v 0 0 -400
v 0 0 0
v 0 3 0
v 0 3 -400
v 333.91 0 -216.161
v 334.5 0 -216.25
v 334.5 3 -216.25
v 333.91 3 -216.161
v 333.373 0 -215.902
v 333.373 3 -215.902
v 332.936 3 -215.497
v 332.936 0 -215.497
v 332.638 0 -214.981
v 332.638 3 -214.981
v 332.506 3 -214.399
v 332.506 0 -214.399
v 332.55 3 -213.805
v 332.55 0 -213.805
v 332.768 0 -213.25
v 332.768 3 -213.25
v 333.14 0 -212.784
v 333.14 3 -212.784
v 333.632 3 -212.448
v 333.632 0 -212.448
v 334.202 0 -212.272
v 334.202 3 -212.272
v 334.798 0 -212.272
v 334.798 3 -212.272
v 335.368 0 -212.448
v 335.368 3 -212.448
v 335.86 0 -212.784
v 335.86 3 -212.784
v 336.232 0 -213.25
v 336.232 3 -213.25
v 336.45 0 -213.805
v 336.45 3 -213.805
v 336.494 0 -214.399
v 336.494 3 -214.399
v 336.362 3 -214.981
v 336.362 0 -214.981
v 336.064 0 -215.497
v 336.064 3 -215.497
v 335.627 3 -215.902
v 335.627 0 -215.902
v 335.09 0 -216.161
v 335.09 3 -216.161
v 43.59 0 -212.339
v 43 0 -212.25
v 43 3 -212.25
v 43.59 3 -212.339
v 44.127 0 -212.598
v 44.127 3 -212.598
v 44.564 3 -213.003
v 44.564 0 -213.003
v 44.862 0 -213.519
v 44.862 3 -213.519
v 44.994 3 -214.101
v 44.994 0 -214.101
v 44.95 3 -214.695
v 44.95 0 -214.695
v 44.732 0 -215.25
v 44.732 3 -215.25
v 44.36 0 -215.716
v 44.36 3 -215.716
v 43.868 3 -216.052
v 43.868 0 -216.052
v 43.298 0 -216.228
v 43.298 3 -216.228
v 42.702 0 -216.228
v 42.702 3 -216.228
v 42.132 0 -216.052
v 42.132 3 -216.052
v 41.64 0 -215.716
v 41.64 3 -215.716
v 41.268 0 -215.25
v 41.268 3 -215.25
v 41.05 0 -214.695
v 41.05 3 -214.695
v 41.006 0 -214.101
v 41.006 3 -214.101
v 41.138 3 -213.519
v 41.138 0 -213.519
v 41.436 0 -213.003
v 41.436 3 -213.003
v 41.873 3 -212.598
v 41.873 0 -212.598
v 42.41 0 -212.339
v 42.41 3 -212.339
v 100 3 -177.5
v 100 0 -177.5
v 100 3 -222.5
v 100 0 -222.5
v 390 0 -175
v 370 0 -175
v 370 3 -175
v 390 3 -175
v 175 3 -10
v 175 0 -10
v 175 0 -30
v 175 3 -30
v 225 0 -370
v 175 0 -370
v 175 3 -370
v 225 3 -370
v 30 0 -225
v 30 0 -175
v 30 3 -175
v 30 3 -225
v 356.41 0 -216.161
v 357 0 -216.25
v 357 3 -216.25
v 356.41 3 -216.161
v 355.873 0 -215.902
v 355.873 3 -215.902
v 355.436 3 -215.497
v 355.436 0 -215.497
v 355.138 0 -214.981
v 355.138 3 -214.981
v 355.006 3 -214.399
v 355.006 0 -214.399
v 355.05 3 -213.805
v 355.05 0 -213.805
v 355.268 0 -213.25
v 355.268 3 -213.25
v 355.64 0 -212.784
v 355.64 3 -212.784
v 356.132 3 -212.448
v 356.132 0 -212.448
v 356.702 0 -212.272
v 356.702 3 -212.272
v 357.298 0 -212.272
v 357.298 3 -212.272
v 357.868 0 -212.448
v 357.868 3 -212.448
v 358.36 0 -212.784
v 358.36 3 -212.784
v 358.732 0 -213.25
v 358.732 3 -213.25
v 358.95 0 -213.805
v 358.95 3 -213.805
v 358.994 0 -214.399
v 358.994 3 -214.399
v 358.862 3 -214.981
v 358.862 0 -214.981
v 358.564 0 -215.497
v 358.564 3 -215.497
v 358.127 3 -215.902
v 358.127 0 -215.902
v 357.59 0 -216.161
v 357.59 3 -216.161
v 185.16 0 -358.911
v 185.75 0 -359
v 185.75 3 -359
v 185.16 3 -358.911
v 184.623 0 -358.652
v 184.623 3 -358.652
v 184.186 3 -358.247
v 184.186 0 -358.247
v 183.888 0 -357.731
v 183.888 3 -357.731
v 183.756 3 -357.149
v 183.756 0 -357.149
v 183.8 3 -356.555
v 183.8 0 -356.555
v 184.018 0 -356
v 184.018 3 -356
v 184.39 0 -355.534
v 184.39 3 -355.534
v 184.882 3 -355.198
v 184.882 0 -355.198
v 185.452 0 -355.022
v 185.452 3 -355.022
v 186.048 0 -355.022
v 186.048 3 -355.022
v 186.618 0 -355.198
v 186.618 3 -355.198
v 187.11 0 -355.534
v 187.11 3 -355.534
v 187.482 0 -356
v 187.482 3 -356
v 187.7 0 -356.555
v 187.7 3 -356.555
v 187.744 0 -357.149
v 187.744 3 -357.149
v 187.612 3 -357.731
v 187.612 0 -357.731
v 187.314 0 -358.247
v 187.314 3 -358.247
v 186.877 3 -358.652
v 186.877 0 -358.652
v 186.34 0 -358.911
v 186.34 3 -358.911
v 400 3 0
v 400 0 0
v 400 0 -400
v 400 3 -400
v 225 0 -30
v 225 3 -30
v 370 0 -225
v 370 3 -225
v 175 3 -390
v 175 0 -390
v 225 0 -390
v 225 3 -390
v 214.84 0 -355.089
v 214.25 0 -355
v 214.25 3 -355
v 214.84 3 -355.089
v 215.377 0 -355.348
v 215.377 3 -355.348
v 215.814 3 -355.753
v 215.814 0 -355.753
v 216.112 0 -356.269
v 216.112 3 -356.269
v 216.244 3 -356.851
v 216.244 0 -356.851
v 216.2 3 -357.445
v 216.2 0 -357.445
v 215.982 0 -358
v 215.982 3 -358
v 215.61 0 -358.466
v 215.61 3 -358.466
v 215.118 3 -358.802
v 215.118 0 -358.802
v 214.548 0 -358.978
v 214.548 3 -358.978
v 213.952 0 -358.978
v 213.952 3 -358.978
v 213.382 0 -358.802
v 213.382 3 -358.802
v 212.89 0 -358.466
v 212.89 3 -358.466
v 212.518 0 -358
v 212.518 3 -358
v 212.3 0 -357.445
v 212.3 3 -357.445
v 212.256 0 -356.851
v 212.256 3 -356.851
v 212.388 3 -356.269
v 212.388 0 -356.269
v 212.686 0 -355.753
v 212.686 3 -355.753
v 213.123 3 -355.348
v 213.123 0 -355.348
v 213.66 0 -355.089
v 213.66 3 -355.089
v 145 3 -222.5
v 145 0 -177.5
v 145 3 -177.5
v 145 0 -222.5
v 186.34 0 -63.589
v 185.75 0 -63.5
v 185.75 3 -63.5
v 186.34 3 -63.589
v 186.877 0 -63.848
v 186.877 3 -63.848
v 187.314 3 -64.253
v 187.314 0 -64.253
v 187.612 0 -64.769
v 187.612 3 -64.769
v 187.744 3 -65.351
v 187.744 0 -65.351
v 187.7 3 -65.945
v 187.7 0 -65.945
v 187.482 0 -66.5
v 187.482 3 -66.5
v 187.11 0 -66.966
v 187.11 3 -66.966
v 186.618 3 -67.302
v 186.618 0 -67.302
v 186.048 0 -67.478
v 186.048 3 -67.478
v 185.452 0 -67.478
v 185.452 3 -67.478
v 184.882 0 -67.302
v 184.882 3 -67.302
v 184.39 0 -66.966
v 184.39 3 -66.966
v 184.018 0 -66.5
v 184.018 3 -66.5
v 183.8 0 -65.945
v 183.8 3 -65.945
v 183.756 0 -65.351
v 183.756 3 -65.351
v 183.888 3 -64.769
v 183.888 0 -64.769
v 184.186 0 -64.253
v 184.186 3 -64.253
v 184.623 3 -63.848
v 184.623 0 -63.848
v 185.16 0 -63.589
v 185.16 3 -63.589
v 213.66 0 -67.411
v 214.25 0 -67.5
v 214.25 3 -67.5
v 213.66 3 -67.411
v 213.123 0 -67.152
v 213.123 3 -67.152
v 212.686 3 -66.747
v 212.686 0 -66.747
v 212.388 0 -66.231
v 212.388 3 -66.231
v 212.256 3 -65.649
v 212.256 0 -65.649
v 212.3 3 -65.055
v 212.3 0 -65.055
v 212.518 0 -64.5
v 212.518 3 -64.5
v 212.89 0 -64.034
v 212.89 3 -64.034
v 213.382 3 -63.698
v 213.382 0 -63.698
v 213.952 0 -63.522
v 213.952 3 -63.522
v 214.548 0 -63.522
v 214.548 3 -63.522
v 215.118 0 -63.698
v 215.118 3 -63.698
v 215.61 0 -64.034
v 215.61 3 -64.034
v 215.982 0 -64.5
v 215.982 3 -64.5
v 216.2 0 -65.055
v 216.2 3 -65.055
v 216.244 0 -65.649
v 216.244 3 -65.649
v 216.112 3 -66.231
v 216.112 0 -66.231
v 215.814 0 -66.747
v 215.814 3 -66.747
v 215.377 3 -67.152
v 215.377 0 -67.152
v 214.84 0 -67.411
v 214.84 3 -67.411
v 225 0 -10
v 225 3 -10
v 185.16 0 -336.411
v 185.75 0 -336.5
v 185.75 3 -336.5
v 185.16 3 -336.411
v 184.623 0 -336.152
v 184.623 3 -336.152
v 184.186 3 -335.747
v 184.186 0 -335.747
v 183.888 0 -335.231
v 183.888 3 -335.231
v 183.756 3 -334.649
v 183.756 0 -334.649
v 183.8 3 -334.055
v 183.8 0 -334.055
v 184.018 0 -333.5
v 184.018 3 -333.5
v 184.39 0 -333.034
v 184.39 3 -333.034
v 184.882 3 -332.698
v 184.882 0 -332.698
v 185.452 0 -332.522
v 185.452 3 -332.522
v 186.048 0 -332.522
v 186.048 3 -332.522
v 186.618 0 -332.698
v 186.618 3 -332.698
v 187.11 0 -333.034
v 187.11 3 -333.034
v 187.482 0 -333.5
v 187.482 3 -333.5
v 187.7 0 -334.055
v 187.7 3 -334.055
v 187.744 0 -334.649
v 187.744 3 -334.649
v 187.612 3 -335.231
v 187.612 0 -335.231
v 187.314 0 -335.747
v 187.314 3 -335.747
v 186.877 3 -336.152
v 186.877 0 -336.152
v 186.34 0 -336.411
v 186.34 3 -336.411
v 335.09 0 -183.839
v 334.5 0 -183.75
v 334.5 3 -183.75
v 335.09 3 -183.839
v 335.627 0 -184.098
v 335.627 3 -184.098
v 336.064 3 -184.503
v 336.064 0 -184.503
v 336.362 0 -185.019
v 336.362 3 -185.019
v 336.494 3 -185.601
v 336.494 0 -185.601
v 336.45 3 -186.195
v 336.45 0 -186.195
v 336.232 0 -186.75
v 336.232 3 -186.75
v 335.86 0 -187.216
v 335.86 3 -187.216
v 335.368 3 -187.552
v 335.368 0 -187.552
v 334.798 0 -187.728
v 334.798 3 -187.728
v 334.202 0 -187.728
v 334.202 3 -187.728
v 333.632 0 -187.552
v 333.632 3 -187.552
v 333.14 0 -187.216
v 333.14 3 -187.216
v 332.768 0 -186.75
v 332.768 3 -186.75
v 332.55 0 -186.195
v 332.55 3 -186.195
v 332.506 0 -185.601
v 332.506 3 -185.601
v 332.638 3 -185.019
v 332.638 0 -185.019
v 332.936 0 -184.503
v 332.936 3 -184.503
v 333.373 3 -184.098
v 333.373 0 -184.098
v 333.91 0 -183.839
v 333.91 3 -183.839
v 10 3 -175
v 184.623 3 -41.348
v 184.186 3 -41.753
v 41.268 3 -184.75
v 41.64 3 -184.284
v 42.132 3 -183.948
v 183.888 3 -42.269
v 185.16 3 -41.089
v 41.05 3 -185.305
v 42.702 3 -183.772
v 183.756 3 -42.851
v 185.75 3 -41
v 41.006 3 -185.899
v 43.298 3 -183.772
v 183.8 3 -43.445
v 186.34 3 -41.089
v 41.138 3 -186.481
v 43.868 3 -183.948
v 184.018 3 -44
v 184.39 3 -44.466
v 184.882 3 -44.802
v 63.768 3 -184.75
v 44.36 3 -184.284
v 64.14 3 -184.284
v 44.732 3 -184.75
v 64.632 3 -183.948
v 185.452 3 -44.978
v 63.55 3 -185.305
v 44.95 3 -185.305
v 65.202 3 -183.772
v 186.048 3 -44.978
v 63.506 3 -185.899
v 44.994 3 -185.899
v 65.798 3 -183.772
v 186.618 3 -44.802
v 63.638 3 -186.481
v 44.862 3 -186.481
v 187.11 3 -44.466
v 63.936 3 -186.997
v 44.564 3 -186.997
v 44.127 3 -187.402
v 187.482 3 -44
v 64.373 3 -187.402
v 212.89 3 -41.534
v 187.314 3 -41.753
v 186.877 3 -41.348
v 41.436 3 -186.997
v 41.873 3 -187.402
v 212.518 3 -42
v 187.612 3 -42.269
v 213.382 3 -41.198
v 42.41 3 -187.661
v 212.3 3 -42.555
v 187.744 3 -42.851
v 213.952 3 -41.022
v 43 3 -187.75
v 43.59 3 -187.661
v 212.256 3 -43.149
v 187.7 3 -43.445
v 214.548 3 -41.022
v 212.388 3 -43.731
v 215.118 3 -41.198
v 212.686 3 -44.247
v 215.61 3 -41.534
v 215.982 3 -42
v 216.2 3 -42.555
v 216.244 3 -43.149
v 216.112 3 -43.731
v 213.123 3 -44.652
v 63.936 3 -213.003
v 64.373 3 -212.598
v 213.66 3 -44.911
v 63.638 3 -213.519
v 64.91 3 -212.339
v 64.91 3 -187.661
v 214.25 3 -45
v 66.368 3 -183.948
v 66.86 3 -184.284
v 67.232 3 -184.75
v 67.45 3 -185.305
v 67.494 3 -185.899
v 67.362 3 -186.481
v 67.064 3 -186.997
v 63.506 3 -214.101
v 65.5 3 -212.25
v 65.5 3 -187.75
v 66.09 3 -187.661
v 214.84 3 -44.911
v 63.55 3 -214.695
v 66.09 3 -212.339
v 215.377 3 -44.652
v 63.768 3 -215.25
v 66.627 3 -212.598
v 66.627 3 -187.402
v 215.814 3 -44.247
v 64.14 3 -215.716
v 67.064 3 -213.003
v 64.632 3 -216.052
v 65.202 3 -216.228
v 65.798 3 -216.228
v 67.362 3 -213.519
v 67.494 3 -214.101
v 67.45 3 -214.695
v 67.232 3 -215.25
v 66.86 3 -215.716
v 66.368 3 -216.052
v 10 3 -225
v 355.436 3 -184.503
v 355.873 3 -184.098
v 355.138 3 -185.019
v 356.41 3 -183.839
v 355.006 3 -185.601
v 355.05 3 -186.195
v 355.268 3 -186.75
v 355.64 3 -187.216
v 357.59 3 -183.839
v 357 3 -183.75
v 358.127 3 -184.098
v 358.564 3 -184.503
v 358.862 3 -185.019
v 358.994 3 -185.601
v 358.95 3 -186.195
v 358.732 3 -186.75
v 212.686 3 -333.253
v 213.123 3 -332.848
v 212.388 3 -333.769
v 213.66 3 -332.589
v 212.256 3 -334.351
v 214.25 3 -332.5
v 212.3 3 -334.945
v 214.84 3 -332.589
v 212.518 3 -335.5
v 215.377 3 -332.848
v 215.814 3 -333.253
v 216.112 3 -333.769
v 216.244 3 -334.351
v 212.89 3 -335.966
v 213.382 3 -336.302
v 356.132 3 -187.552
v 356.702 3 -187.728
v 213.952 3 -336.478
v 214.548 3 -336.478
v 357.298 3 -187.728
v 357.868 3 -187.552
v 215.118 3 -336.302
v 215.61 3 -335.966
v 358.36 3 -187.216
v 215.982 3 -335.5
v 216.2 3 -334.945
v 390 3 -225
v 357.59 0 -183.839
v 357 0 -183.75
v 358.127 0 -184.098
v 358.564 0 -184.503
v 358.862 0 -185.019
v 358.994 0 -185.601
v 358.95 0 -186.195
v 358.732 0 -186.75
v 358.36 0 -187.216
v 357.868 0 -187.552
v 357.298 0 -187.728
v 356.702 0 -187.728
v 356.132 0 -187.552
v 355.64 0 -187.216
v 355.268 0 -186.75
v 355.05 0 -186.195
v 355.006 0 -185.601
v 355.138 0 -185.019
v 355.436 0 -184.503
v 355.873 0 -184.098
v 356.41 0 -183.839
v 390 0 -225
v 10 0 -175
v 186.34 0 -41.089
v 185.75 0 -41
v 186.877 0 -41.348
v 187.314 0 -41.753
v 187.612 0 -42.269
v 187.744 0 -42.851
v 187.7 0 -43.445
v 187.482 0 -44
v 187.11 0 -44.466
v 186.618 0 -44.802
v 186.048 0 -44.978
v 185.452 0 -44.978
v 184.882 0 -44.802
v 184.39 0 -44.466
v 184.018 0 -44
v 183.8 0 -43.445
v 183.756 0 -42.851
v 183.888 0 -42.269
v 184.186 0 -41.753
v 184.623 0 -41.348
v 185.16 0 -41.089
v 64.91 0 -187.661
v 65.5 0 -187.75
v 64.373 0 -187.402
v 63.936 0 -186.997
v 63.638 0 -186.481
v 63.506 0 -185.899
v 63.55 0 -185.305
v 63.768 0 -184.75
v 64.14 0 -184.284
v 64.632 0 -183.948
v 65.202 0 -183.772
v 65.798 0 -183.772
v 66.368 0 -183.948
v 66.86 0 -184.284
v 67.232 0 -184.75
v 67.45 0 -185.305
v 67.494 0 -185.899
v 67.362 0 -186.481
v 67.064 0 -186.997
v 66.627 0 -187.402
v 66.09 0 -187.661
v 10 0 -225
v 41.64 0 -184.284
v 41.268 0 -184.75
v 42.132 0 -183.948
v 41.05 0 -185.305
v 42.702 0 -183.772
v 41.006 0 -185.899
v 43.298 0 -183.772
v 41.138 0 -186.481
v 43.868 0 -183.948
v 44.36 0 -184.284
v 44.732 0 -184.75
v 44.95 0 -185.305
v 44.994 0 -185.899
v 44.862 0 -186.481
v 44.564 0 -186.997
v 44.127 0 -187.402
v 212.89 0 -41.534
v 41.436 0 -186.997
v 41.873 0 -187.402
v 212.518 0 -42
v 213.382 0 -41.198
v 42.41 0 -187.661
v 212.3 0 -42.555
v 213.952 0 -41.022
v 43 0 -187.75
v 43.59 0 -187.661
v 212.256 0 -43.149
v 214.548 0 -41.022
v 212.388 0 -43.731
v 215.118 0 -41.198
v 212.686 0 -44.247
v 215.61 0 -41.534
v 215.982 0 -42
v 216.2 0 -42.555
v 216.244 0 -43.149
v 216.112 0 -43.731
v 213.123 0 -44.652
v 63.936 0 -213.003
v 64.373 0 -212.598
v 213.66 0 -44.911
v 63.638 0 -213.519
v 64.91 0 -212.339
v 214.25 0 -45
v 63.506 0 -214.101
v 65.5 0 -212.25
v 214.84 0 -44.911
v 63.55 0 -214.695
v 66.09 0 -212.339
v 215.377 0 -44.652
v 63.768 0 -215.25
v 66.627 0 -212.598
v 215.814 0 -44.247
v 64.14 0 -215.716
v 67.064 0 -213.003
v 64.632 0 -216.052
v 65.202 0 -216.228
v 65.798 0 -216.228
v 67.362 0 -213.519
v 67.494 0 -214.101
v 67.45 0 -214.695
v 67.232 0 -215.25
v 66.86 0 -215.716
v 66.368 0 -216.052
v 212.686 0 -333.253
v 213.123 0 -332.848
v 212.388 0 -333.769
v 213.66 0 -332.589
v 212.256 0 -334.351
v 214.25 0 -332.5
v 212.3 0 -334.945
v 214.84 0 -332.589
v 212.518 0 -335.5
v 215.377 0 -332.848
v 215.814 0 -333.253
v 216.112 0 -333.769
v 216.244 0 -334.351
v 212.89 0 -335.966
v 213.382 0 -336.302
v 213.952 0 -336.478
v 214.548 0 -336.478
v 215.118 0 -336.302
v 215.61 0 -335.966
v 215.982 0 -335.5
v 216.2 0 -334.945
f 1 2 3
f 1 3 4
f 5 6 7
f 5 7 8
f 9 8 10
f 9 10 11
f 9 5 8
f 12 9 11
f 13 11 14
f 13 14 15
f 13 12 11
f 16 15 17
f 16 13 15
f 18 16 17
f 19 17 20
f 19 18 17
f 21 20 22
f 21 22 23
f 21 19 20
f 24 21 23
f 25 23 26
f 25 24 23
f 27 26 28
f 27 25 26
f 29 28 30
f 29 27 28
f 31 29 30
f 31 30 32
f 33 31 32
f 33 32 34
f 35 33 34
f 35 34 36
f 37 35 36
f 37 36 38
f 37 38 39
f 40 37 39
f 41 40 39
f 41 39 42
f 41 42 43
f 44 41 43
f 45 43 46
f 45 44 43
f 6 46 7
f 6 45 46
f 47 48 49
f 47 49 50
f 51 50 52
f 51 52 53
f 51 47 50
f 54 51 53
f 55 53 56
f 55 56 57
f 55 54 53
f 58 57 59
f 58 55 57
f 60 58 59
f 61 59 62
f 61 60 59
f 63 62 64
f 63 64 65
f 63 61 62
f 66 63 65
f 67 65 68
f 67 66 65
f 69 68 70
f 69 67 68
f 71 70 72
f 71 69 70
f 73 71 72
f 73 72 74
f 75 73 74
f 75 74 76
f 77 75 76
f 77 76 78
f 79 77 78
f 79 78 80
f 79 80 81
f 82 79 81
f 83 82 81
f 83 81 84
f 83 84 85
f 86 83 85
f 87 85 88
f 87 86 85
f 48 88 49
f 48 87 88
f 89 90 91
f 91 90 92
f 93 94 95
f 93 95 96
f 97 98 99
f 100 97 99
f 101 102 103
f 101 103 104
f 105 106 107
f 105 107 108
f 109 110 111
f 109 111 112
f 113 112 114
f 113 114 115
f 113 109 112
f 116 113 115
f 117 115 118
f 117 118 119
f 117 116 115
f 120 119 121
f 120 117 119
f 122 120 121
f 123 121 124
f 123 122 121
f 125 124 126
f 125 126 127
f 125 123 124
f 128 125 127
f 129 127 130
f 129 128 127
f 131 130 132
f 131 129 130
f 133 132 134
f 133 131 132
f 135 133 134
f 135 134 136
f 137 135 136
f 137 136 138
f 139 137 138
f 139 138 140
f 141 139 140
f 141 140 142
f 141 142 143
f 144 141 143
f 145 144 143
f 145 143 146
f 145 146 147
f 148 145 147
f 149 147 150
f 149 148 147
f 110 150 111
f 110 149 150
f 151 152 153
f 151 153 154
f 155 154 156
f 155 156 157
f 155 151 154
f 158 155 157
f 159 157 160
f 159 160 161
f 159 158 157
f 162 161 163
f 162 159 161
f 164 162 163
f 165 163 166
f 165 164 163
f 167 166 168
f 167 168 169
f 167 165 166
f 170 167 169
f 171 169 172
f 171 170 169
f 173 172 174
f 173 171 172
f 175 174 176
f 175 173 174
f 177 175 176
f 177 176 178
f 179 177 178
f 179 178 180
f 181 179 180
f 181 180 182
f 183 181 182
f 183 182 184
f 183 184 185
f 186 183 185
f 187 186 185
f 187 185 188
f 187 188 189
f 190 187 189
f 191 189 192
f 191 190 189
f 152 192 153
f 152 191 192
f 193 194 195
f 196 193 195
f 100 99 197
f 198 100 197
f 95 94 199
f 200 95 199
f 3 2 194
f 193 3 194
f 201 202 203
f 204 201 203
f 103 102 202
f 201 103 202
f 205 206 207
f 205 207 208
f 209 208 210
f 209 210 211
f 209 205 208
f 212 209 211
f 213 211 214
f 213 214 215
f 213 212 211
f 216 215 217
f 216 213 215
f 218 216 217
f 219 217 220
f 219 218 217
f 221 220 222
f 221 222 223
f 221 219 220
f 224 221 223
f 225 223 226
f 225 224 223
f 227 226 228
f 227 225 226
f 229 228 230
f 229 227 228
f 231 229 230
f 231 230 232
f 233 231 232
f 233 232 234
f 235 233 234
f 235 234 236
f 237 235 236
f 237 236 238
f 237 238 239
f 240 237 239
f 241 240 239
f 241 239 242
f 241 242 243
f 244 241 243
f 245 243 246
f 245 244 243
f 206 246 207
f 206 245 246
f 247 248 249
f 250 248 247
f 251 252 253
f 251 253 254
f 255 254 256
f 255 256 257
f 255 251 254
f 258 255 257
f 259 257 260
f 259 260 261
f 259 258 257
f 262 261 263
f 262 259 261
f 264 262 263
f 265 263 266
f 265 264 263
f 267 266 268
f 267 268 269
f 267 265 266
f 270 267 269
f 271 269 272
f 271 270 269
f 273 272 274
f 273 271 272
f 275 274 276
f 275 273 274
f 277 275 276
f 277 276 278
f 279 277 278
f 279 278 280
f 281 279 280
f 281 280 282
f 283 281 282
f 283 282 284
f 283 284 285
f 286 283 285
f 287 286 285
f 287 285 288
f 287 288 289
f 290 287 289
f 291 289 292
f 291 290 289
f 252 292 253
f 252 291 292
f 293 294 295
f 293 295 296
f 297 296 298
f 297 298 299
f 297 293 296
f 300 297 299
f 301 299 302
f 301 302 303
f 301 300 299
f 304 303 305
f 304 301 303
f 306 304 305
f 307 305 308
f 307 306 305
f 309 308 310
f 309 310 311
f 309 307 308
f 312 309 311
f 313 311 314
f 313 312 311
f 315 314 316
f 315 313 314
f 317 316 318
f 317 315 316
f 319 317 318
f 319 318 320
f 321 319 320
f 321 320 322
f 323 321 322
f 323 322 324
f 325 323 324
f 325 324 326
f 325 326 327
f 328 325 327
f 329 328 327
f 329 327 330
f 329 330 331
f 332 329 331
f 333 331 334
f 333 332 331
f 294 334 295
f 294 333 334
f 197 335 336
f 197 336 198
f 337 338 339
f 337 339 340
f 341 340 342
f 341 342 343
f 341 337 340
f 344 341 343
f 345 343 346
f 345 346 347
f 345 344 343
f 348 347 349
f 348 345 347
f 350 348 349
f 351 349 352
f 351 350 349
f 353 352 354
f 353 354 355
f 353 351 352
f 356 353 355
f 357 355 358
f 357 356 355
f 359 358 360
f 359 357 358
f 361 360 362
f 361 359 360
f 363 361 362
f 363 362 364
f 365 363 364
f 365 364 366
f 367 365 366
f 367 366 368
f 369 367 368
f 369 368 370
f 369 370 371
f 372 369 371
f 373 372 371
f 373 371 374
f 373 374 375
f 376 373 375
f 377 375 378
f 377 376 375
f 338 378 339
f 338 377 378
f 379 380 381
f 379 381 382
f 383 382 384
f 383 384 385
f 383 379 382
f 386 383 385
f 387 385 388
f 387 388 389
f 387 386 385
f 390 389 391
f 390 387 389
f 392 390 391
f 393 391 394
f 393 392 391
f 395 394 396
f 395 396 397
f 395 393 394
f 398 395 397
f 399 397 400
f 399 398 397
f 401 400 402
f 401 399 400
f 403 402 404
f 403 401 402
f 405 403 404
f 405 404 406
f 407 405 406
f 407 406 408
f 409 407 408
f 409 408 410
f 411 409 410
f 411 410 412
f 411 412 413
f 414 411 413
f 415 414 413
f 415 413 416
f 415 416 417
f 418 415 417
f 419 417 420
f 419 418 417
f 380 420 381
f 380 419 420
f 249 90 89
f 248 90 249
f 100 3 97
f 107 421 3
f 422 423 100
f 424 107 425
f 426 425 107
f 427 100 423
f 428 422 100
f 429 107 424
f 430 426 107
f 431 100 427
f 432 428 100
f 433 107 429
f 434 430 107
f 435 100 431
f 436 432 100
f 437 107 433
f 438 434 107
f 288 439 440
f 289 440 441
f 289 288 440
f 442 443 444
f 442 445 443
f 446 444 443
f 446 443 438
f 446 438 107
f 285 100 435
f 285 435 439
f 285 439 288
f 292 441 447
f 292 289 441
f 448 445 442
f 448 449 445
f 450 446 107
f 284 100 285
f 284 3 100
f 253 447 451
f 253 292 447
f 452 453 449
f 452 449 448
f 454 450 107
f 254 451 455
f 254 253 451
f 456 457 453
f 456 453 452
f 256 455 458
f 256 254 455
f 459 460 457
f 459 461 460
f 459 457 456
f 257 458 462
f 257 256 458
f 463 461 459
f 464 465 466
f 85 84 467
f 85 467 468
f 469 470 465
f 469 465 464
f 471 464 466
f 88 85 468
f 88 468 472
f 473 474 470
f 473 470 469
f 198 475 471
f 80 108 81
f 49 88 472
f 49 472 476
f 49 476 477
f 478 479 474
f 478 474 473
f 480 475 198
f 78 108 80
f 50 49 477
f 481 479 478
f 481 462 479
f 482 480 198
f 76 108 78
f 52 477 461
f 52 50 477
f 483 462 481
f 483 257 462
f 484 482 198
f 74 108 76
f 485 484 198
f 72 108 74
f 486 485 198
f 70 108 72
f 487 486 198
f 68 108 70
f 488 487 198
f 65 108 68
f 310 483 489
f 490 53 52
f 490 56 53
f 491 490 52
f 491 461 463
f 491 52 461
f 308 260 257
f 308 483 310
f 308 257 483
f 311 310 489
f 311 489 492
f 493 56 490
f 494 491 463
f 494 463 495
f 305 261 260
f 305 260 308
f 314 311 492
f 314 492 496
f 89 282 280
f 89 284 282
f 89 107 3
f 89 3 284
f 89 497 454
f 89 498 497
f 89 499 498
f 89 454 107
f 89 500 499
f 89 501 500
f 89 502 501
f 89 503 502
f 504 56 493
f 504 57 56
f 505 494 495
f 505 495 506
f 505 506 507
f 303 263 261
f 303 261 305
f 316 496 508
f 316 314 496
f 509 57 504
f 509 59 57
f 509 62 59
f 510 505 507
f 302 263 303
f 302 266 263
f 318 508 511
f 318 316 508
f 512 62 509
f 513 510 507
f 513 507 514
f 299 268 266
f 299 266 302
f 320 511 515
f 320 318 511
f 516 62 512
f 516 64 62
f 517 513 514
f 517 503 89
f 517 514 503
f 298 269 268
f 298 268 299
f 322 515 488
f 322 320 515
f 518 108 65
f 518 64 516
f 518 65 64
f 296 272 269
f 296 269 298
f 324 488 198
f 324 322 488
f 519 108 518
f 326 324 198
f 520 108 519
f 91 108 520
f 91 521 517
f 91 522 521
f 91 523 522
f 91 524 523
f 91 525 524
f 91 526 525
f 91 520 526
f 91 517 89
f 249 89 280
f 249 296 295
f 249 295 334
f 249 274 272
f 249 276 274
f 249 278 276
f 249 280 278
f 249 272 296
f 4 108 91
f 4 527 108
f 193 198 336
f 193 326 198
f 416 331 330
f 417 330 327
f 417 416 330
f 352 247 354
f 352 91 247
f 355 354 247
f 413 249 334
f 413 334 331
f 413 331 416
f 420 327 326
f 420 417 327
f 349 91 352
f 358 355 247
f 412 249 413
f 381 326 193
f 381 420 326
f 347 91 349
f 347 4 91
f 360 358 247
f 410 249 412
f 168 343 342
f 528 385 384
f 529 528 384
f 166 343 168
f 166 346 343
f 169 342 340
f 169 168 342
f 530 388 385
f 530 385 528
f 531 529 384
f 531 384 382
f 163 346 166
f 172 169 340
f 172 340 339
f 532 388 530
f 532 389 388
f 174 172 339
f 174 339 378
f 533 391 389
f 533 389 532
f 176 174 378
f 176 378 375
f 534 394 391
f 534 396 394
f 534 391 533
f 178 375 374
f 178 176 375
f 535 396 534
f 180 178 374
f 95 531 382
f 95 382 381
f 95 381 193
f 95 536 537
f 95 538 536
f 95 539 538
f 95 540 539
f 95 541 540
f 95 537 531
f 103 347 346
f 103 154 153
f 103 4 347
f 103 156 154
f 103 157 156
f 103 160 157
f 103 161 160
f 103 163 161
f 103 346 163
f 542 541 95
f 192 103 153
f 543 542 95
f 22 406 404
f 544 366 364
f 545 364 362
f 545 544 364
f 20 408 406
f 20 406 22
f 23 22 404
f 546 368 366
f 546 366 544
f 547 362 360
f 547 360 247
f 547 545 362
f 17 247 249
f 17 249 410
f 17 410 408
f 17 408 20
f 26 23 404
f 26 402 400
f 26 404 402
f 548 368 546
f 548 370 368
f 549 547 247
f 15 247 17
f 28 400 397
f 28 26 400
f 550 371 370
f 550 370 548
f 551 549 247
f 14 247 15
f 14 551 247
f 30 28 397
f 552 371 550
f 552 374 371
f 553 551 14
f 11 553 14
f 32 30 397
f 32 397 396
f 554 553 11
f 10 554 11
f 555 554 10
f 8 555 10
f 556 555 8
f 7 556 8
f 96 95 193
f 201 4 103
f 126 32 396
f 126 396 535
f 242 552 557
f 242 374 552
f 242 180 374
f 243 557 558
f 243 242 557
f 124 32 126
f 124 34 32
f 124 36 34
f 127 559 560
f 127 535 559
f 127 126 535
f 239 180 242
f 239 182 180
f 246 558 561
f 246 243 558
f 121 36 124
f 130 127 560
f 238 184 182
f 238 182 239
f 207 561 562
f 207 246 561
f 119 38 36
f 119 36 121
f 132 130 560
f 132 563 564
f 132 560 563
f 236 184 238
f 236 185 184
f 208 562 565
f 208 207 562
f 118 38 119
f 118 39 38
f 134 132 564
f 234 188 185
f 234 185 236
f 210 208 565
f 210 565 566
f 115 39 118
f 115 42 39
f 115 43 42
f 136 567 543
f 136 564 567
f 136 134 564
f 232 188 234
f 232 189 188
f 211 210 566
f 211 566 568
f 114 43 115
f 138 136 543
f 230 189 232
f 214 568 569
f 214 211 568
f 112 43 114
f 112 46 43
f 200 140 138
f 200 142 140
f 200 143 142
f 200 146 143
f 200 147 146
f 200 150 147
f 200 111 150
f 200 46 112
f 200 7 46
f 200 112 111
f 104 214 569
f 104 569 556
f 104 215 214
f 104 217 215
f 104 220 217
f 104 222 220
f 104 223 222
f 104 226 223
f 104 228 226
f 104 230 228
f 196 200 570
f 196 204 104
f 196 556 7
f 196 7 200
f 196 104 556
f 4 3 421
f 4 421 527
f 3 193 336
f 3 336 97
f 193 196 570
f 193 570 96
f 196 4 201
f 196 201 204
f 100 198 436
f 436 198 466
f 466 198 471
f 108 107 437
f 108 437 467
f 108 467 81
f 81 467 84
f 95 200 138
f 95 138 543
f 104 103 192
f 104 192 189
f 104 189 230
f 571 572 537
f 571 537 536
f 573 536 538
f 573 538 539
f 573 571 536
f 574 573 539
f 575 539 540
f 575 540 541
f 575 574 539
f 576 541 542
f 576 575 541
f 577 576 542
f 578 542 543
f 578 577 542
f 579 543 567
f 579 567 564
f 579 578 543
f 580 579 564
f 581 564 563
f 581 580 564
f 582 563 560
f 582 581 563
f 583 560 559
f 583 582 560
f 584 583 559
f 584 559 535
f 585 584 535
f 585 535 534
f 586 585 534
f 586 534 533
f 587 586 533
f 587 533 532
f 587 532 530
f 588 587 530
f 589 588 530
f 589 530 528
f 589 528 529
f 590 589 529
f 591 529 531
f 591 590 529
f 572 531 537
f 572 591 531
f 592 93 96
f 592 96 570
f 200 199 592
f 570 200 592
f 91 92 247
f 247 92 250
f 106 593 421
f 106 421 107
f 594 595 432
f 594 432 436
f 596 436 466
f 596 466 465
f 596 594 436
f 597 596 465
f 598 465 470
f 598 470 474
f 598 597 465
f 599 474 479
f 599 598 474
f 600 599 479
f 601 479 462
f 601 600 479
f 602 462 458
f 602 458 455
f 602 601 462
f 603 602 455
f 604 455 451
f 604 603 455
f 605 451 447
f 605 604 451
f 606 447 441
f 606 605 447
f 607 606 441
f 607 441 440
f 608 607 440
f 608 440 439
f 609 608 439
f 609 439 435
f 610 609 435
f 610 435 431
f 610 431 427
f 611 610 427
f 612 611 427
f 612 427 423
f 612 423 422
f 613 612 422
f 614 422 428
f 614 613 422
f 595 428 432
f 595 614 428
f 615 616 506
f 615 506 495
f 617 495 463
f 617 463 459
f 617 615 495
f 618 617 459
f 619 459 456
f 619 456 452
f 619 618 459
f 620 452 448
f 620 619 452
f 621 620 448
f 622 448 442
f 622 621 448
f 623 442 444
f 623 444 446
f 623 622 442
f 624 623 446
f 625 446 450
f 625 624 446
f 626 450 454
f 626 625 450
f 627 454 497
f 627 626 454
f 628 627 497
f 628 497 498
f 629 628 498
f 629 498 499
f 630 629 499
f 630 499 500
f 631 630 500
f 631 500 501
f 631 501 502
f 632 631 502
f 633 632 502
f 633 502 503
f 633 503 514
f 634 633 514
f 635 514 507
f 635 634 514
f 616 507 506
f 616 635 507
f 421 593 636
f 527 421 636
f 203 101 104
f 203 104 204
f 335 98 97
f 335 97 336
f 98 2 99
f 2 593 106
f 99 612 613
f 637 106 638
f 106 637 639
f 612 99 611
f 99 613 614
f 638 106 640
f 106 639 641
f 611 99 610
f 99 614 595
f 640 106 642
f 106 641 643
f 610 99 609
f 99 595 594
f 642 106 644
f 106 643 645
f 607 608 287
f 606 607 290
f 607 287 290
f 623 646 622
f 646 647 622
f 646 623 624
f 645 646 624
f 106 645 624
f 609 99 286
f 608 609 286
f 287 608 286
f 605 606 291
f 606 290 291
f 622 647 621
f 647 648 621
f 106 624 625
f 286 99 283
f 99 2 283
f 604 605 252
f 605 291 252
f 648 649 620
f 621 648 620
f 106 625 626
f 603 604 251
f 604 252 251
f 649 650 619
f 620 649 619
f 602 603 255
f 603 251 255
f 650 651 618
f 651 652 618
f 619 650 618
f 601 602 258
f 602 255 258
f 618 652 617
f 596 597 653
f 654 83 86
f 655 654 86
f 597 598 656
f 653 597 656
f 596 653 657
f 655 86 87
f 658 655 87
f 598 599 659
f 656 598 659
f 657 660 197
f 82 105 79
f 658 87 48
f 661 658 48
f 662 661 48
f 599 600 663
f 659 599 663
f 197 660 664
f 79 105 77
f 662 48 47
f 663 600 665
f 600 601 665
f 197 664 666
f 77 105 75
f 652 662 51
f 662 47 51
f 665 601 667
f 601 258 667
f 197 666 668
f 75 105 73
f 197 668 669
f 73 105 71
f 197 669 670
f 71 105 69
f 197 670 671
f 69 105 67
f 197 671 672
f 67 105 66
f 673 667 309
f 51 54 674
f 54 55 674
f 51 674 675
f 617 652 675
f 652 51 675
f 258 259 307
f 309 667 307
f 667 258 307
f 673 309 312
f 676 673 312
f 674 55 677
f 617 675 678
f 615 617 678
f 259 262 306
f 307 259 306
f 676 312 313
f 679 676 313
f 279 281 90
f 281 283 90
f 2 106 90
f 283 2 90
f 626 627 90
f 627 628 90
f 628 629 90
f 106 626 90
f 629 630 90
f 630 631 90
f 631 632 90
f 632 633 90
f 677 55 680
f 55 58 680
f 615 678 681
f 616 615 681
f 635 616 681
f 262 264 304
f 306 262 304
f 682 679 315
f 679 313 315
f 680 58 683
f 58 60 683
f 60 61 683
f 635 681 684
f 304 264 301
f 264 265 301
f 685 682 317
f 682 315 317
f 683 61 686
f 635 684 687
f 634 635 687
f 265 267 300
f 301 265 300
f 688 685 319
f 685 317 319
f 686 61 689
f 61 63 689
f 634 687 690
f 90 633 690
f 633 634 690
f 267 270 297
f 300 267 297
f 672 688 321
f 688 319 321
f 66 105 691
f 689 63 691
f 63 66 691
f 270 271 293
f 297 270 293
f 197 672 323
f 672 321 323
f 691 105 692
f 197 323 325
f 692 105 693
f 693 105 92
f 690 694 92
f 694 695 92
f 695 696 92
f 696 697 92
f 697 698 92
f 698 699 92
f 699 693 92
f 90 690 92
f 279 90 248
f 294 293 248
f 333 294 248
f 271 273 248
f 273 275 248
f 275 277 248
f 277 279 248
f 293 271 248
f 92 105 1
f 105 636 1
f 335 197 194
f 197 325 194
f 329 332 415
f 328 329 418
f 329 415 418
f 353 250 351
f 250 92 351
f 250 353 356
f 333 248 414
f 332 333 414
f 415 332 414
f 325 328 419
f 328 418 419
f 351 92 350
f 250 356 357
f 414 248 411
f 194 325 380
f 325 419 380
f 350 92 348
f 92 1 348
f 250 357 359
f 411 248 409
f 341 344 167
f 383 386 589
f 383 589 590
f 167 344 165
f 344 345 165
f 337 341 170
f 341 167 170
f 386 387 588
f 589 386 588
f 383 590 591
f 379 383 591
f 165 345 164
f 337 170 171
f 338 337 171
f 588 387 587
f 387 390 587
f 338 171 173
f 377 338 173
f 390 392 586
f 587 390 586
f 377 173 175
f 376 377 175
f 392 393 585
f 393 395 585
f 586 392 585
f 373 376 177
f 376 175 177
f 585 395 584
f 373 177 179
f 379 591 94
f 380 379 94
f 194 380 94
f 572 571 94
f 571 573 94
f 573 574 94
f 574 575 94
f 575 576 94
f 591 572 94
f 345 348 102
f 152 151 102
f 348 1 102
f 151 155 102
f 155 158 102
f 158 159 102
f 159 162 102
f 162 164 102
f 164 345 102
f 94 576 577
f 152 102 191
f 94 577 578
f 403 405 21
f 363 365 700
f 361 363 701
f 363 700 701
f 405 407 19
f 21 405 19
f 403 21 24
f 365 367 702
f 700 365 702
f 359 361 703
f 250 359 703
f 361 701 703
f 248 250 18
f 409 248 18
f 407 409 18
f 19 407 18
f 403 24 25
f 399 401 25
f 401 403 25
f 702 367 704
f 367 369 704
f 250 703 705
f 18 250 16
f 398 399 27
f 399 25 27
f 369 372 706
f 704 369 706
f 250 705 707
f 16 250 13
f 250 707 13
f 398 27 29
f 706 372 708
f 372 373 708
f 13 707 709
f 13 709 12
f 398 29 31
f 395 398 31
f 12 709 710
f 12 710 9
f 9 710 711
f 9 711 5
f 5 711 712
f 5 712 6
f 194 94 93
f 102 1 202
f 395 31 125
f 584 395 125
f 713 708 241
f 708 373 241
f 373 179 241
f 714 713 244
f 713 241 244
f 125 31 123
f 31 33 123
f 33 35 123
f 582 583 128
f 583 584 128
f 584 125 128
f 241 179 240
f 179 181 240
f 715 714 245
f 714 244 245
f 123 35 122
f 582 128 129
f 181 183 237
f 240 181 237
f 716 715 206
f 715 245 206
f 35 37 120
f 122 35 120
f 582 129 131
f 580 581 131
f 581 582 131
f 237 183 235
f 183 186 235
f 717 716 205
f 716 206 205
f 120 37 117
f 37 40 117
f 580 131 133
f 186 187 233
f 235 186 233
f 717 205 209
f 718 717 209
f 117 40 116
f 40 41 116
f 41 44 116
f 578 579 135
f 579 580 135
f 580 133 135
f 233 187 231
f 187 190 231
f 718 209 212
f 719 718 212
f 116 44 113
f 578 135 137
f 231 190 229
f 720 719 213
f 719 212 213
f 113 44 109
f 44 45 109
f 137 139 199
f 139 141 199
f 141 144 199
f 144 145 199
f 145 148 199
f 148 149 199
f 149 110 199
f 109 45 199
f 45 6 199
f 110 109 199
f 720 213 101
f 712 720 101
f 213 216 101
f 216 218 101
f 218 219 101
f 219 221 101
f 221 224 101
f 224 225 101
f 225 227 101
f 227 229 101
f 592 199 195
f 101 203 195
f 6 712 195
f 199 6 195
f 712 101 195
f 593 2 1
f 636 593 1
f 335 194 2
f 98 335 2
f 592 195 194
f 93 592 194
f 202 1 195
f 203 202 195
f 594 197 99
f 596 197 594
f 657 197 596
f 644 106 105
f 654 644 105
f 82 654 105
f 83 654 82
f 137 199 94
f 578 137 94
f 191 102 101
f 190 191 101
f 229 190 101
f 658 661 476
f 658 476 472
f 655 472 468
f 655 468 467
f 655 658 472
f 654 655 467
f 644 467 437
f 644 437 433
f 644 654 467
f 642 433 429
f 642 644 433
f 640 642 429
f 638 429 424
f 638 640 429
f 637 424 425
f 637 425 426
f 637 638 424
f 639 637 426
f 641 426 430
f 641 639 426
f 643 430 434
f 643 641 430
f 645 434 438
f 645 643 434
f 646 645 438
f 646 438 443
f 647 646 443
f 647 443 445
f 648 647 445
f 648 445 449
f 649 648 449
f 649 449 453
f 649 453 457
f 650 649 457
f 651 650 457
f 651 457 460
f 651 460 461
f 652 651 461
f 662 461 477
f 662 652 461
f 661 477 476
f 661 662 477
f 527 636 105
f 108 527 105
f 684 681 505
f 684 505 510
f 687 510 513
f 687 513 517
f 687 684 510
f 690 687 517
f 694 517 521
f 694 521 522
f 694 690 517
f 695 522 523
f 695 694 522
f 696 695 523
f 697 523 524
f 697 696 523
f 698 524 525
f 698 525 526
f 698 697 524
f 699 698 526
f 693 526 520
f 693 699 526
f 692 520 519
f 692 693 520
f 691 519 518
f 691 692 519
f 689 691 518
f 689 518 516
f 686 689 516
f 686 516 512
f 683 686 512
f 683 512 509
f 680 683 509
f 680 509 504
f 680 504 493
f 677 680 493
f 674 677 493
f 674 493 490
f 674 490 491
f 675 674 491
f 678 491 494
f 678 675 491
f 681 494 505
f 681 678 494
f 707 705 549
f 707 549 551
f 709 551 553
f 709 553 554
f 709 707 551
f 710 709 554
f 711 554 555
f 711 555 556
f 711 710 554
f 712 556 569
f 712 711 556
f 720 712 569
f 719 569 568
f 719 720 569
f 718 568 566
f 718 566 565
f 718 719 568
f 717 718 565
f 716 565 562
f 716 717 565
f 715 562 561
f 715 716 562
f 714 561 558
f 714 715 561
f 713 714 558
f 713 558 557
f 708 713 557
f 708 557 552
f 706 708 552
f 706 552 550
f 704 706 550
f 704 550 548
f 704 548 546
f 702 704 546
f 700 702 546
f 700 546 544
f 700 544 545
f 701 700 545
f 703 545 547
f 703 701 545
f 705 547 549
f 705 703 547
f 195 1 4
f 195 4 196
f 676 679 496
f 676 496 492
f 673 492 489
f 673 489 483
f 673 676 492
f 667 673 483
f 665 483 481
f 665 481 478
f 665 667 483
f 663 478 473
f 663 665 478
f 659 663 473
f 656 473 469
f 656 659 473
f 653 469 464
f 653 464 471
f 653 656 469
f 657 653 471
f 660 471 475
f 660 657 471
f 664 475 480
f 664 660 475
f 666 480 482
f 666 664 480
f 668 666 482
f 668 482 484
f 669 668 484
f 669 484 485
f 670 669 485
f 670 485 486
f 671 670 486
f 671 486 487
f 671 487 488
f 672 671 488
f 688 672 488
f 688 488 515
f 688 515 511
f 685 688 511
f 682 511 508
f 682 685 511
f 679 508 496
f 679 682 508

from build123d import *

# Parameters (mm, degrees)
SKETCH1_W      = 400
SKETCH1_H      = 400
SKETCH1_R      = 2
SKETCH1_W_2    = 20
SKETCH1_H_2    = 50
SKETCH1_W_3    = 50
SKETCH1_H_3    = 20
SKETCH1_W_4    = 45
SKETCH1_H_4    = 45
EXTRUDE1_DEPTH = 3


with BuildPart() as part:
    # Sketch1 → Extrude1 (new body)
    with BuildSketch(Plane(origin=(0, 0, 0), x_dir=(1, 0, 0), z_dir=(0, 1, 0))):
        with Locations((200, 200)):
            Rectangle(SKETCH1_W, SKETCH1_H)
        with Locations(Location((185.75, 43, 0), (0, 0, 270))):
            Circle(SKETCH1_R, mode=Mode.SUBTRACT)
        with Locations(Location((185.75, 65.5, 0), (0, 0, 270))):
            Circle(SKETCH1_R, mode=Mode.SUBTRACT)
        with Locations(Location((214.25, 65.5, 0), (0, 0, 90))):
            Circle(SKETCH1_R, mode=Mode.SUBTRACT)
        with Locations(Location((214.25, 43, 0), (0, 0, 90))):
            Circle(SKETCH1_R, mode=Mode.SUBTRACT)
        with Locations(Location((43, 214.25, 0), (0, 0, 270))):
            Circle(SKETCH1_R, mode=Mode.SUBTRACT)
        with Locations(Location((65.5, 214.25, 0), (0, 0, 270))):
            Circle(SKETCH1_R, mode=Mode.SUBTRACT)
        with Locations(Location((65.5, 185.75, 0), (0, 0, 90))):
            Circle(SKETCH1_R, mode=Mode.SUBTRACT)
        with Locations(Location((43, 185.75, 0), (0, 0, 90))):
            Circle(SKETCH1_R, mode=Mode.SUBTRACT)
        with Locations(Location((214.25, 357, 0), (0, 0, 270))):
            Circle(SKETCH1_R, mode=Mode.SUBTRACT)
        with Locations(Location((214.25, 334.5, 0), (0, 0, 270))):
            Circle(SKETCH1_R, mode=Mode.SUBTRACT)
        with Locations(Location((185.75, 334.5, 0), (0, 0, 90))):
            Circle(SKETCH1_R, mode=Mode.SUBTRACT)
        with Locations(Location((185.75, 357, 0), (0, 0, 90))):
            Circle(SKETCH1_R, mode=Mode.SUBTRACT)
        with Locations(Location((357, 185.75, 0), (0, 0, 270))):
            Circle(SKETCH1_R, mode=Mode.SUBTRACT)
        with Locations(Location((334.5, 185.75, 0), (0, 0, 270))):
            Circle(SKETCH1_R, mode=Mode.SUBTRACT)
        with Locations(Location((334.5, 214.25, 0), (0, 0, 90))):
            Circle(SKETCH1_R, mode=Mode.SUBTRACT)
        with Locations(Location((357, 214.25, 0), (0, 0, 90))):
            Circle(SKETCH1_R, mode=Mode.SUBTRACT)
        with Locations((20, 200)):
            Rectangle(SKETCH1_W_2, SKETCH1_H_2, mode=Mode.SUBTRACT)
        with Locations((200, 20)):
            Rectangle(SKETCH1_W_3, SKETCH1_H_3, mode=Mode.SUBTRACT)
        with Locations((200, 380)):
            Rectangle(SKETCH1_W_3, SKETCH1_H_3, mode=Mode.SUBTRACT)
        with Locations((380, 200)):
            Rectangle(SKETCH1_W_2, SKETCH1_H_2, mode=Mode.SUBTRACT)
        with Locations((122.5, 200)):
            Rectangle(SKETCH1_W_4, SKETCH1_H_4, mode=Mode.SUBTRACT)
    extrude(amount=EXTRUDE1_DEPTH)


solid = part.part
